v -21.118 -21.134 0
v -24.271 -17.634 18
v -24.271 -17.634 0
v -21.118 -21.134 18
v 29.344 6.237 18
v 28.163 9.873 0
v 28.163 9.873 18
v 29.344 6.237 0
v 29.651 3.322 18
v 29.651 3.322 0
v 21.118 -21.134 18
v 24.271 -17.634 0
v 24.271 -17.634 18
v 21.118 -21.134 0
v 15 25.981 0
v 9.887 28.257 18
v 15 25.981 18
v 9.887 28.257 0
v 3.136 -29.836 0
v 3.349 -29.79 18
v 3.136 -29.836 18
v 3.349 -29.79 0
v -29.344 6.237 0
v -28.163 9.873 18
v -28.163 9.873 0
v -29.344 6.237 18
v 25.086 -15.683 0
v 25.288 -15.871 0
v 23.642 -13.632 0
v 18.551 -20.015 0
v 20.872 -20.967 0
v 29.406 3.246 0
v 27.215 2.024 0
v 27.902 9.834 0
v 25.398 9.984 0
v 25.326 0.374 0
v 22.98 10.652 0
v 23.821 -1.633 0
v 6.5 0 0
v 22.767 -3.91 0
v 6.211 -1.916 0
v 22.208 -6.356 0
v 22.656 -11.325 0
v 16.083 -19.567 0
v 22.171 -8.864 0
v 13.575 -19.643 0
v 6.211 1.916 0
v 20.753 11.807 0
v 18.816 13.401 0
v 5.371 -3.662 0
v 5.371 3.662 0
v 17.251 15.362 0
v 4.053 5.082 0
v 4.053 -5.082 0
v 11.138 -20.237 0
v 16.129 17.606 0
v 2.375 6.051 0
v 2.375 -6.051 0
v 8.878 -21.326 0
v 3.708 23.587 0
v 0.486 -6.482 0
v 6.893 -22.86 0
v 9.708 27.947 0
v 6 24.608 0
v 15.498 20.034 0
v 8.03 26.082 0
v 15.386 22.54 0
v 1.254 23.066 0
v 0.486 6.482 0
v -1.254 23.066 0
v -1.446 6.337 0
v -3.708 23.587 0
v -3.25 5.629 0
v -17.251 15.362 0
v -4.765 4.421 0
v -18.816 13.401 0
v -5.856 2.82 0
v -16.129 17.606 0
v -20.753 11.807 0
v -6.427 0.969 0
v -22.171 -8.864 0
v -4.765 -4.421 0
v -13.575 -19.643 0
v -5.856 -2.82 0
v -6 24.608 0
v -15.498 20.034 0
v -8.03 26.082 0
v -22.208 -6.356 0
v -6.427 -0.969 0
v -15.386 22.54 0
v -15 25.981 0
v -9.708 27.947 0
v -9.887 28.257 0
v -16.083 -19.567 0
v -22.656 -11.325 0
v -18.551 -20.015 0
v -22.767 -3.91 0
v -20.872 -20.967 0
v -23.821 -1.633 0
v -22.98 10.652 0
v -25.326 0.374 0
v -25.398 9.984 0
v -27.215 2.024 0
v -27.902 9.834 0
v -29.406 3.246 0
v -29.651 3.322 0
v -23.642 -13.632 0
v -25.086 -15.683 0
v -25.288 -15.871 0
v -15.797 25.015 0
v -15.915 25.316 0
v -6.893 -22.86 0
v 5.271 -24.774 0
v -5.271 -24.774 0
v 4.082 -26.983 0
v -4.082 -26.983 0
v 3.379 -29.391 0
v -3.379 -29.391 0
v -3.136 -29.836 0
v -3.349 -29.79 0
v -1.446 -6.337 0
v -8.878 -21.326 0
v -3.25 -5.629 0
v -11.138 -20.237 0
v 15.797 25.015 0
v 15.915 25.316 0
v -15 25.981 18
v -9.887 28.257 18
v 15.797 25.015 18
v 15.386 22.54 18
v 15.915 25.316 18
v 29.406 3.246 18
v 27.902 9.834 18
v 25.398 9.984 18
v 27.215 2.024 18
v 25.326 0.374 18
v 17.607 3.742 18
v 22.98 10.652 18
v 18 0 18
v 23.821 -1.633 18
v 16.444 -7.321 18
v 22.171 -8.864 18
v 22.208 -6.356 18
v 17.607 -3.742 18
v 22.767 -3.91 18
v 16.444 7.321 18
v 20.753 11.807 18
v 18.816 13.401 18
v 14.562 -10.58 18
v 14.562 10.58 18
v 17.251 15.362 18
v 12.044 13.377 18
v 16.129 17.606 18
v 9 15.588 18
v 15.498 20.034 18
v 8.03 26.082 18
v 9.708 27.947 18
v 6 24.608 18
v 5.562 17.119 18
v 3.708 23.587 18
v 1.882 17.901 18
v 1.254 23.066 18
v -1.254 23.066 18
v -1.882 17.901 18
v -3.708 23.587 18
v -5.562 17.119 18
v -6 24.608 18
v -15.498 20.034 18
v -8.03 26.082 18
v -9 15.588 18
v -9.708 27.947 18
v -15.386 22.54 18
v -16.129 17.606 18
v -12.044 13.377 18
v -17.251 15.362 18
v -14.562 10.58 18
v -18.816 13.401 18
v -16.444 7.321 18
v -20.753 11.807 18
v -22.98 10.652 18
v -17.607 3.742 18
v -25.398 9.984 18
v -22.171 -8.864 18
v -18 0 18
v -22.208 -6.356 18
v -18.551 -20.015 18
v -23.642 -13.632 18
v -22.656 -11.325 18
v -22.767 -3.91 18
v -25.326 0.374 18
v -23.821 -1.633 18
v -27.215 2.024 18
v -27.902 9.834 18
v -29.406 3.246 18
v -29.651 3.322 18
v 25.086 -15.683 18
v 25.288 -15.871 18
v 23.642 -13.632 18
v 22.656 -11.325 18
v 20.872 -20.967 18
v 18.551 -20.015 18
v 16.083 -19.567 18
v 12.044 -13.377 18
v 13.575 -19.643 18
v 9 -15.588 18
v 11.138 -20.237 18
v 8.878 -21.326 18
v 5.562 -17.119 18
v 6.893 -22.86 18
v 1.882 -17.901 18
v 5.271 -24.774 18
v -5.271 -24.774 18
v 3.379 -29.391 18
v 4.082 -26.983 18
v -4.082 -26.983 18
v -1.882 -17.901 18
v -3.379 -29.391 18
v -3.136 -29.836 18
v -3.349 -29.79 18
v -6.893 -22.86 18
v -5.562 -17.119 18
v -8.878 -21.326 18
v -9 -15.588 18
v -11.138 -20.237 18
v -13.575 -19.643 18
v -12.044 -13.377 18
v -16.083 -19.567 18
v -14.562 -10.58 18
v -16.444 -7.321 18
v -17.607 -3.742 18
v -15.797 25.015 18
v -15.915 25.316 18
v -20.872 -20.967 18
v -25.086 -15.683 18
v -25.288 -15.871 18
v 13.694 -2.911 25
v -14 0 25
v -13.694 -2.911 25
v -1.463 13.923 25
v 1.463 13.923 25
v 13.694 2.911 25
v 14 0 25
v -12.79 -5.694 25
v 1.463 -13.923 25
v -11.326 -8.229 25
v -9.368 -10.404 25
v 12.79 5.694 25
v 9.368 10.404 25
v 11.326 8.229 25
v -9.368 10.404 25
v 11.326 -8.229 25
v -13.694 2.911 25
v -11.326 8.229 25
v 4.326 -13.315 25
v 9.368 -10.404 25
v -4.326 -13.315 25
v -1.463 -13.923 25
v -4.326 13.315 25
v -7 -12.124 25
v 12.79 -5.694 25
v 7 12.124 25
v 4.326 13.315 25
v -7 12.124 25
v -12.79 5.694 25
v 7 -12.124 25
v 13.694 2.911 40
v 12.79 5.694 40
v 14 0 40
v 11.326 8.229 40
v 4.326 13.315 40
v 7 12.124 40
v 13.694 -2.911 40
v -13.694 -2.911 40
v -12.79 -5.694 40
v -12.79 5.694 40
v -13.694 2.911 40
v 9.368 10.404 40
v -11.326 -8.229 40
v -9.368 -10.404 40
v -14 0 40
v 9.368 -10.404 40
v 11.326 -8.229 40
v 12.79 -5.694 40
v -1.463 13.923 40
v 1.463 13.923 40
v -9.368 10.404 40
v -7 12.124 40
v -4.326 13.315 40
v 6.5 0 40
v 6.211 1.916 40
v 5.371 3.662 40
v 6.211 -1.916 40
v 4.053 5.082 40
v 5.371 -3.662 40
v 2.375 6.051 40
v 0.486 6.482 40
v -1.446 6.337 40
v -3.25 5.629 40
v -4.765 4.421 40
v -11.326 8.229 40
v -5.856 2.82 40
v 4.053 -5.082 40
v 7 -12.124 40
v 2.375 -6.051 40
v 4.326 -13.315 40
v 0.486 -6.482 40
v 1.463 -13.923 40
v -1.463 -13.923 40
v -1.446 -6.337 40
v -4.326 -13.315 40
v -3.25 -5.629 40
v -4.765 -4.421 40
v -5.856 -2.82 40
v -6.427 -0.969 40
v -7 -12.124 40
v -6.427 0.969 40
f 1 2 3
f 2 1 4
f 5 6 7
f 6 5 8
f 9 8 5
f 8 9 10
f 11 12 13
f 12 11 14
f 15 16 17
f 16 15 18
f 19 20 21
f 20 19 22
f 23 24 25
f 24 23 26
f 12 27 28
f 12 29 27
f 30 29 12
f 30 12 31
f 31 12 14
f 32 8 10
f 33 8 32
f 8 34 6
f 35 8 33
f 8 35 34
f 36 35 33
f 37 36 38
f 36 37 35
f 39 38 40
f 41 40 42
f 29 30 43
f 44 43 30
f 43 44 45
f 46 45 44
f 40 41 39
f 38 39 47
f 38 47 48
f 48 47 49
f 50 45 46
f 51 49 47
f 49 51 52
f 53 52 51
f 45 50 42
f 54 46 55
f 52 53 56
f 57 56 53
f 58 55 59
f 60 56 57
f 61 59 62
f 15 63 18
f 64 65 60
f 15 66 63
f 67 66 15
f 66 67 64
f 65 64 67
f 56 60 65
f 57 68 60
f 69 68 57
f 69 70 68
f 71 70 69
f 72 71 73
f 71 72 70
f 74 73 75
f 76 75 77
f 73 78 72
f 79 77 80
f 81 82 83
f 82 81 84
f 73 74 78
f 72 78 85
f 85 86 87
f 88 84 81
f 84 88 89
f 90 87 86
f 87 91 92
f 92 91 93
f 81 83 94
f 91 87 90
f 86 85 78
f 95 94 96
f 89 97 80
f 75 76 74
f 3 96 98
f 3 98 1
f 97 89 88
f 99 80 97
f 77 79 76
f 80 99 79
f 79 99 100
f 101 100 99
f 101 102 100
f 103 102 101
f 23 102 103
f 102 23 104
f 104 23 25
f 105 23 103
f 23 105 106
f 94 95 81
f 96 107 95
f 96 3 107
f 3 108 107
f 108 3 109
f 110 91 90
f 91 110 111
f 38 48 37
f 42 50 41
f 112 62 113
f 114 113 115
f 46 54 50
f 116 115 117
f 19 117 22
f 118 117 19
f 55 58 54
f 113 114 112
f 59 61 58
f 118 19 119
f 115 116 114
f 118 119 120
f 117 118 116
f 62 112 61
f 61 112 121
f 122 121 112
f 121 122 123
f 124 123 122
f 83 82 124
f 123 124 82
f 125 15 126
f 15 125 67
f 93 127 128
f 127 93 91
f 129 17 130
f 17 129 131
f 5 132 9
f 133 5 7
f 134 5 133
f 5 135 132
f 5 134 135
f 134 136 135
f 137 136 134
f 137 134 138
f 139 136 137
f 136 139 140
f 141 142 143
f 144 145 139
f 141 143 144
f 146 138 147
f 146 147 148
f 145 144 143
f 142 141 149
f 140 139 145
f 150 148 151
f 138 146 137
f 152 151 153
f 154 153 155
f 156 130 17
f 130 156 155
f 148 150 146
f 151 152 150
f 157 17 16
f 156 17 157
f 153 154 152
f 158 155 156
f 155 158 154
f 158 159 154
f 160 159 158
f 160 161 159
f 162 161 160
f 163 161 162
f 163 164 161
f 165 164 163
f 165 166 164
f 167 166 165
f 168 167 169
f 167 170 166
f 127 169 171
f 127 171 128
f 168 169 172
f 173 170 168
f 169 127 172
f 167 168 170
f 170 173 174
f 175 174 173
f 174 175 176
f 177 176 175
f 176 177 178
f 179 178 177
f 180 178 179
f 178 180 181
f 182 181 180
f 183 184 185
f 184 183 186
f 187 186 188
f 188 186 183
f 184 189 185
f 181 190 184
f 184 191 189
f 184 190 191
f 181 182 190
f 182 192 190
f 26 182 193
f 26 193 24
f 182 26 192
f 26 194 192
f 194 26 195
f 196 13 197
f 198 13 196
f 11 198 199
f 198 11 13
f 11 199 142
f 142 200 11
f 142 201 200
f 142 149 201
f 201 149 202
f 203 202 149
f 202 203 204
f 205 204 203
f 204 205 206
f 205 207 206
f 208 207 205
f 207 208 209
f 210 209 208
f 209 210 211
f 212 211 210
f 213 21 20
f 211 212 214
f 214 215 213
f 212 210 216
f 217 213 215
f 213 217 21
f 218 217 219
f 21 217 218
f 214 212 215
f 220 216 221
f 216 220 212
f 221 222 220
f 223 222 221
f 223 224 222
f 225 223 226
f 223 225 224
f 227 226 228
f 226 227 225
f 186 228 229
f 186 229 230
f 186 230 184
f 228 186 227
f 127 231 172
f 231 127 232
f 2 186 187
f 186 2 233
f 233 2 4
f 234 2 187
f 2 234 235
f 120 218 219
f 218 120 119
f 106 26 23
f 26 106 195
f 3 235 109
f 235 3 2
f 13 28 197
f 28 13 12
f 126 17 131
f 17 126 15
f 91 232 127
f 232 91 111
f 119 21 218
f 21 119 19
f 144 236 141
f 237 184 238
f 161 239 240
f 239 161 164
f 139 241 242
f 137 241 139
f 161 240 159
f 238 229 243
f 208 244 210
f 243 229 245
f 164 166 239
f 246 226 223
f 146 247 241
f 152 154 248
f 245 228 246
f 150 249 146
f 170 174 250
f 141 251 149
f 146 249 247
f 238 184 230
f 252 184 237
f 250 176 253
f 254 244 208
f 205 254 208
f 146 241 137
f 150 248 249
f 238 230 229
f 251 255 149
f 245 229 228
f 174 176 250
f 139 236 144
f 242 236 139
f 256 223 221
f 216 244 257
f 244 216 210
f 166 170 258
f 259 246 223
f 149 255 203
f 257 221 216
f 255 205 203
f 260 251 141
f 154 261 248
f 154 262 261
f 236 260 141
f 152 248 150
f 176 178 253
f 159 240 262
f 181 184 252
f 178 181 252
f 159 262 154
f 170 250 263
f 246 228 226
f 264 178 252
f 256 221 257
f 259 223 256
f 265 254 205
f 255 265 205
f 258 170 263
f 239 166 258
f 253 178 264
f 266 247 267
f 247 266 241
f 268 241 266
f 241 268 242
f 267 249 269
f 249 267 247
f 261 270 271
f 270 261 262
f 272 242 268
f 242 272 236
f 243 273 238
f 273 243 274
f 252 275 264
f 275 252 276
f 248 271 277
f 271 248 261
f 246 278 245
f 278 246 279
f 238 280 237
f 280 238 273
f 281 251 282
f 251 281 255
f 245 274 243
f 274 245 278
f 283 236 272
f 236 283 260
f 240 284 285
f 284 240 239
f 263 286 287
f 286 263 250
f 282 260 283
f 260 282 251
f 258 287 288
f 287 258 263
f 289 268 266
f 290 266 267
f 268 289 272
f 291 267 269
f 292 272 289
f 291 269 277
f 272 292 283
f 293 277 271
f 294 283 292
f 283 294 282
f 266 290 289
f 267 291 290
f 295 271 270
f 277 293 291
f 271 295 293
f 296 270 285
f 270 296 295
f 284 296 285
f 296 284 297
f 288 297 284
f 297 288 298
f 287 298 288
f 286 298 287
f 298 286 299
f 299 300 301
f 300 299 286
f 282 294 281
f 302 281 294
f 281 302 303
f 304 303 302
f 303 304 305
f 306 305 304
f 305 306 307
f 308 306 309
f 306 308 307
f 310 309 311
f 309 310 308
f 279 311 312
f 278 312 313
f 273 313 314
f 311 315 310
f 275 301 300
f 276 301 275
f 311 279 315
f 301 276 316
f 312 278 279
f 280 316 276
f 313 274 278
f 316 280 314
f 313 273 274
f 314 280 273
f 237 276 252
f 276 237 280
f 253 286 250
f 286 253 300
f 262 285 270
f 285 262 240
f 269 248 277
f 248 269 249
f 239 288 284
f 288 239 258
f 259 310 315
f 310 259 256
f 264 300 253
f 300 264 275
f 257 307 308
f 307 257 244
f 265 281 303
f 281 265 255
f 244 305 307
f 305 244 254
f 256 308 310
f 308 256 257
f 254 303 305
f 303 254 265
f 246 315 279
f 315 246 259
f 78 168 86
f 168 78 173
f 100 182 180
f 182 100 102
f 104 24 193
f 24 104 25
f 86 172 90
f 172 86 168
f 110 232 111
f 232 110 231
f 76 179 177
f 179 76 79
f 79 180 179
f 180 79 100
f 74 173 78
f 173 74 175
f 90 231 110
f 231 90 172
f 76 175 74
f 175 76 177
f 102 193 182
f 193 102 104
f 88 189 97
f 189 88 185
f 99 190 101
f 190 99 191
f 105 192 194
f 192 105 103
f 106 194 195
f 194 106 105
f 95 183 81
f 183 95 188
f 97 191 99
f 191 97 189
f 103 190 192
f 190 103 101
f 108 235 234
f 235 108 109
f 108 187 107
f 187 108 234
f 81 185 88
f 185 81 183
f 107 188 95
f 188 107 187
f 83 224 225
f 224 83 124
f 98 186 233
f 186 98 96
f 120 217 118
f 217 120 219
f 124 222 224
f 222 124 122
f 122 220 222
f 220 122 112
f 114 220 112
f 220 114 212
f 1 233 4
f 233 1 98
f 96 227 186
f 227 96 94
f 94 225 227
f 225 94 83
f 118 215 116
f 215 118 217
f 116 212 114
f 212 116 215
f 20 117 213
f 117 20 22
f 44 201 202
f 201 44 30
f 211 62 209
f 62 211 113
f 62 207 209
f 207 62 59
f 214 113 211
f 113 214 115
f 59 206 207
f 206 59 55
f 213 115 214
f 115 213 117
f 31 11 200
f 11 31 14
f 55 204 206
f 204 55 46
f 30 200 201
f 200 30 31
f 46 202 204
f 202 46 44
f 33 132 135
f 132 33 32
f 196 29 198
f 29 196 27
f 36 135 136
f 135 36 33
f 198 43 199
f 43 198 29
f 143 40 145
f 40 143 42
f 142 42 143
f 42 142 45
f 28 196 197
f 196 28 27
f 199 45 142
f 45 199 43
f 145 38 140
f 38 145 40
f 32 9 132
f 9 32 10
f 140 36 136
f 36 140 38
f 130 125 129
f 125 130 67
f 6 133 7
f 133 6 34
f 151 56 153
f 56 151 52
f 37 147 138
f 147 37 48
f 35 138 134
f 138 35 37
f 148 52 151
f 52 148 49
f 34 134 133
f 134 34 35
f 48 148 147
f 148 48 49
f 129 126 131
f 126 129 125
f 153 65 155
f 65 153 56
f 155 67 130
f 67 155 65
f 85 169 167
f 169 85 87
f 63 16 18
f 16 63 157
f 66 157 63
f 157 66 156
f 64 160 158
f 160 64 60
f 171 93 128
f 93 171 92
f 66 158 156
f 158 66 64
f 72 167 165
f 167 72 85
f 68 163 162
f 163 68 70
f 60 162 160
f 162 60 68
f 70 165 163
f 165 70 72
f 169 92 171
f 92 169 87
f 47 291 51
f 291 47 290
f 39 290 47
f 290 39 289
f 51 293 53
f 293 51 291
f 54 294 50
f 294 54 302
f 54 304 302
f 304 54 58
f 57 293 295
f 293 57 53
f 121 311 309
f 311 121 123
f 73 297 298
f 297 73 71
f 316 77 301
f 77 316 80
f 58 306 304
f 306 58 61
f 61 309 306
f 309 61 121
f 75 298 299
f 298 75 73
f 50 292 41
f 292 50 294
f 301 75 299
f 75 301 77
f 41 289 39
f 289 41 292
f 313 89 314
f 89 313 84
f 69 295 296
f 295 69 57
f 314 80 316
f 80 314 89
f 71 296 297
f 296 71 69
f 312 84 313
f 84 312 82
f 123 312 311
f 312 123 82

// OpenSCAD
difference() {
    union() {
        cylinder(r=30,h=18);
        translate([0,0,18])cylinder(r1=18,r2=14,h=7);
        cylinder(r=14,h=40);
    }
    cylinder(r=6.5,h=40);
    a=7;
    for(i=[1:a]) {
        rotate([0,0,360/a*i])translate([0,35])cylinder(r=12,h=18);
    }
}
